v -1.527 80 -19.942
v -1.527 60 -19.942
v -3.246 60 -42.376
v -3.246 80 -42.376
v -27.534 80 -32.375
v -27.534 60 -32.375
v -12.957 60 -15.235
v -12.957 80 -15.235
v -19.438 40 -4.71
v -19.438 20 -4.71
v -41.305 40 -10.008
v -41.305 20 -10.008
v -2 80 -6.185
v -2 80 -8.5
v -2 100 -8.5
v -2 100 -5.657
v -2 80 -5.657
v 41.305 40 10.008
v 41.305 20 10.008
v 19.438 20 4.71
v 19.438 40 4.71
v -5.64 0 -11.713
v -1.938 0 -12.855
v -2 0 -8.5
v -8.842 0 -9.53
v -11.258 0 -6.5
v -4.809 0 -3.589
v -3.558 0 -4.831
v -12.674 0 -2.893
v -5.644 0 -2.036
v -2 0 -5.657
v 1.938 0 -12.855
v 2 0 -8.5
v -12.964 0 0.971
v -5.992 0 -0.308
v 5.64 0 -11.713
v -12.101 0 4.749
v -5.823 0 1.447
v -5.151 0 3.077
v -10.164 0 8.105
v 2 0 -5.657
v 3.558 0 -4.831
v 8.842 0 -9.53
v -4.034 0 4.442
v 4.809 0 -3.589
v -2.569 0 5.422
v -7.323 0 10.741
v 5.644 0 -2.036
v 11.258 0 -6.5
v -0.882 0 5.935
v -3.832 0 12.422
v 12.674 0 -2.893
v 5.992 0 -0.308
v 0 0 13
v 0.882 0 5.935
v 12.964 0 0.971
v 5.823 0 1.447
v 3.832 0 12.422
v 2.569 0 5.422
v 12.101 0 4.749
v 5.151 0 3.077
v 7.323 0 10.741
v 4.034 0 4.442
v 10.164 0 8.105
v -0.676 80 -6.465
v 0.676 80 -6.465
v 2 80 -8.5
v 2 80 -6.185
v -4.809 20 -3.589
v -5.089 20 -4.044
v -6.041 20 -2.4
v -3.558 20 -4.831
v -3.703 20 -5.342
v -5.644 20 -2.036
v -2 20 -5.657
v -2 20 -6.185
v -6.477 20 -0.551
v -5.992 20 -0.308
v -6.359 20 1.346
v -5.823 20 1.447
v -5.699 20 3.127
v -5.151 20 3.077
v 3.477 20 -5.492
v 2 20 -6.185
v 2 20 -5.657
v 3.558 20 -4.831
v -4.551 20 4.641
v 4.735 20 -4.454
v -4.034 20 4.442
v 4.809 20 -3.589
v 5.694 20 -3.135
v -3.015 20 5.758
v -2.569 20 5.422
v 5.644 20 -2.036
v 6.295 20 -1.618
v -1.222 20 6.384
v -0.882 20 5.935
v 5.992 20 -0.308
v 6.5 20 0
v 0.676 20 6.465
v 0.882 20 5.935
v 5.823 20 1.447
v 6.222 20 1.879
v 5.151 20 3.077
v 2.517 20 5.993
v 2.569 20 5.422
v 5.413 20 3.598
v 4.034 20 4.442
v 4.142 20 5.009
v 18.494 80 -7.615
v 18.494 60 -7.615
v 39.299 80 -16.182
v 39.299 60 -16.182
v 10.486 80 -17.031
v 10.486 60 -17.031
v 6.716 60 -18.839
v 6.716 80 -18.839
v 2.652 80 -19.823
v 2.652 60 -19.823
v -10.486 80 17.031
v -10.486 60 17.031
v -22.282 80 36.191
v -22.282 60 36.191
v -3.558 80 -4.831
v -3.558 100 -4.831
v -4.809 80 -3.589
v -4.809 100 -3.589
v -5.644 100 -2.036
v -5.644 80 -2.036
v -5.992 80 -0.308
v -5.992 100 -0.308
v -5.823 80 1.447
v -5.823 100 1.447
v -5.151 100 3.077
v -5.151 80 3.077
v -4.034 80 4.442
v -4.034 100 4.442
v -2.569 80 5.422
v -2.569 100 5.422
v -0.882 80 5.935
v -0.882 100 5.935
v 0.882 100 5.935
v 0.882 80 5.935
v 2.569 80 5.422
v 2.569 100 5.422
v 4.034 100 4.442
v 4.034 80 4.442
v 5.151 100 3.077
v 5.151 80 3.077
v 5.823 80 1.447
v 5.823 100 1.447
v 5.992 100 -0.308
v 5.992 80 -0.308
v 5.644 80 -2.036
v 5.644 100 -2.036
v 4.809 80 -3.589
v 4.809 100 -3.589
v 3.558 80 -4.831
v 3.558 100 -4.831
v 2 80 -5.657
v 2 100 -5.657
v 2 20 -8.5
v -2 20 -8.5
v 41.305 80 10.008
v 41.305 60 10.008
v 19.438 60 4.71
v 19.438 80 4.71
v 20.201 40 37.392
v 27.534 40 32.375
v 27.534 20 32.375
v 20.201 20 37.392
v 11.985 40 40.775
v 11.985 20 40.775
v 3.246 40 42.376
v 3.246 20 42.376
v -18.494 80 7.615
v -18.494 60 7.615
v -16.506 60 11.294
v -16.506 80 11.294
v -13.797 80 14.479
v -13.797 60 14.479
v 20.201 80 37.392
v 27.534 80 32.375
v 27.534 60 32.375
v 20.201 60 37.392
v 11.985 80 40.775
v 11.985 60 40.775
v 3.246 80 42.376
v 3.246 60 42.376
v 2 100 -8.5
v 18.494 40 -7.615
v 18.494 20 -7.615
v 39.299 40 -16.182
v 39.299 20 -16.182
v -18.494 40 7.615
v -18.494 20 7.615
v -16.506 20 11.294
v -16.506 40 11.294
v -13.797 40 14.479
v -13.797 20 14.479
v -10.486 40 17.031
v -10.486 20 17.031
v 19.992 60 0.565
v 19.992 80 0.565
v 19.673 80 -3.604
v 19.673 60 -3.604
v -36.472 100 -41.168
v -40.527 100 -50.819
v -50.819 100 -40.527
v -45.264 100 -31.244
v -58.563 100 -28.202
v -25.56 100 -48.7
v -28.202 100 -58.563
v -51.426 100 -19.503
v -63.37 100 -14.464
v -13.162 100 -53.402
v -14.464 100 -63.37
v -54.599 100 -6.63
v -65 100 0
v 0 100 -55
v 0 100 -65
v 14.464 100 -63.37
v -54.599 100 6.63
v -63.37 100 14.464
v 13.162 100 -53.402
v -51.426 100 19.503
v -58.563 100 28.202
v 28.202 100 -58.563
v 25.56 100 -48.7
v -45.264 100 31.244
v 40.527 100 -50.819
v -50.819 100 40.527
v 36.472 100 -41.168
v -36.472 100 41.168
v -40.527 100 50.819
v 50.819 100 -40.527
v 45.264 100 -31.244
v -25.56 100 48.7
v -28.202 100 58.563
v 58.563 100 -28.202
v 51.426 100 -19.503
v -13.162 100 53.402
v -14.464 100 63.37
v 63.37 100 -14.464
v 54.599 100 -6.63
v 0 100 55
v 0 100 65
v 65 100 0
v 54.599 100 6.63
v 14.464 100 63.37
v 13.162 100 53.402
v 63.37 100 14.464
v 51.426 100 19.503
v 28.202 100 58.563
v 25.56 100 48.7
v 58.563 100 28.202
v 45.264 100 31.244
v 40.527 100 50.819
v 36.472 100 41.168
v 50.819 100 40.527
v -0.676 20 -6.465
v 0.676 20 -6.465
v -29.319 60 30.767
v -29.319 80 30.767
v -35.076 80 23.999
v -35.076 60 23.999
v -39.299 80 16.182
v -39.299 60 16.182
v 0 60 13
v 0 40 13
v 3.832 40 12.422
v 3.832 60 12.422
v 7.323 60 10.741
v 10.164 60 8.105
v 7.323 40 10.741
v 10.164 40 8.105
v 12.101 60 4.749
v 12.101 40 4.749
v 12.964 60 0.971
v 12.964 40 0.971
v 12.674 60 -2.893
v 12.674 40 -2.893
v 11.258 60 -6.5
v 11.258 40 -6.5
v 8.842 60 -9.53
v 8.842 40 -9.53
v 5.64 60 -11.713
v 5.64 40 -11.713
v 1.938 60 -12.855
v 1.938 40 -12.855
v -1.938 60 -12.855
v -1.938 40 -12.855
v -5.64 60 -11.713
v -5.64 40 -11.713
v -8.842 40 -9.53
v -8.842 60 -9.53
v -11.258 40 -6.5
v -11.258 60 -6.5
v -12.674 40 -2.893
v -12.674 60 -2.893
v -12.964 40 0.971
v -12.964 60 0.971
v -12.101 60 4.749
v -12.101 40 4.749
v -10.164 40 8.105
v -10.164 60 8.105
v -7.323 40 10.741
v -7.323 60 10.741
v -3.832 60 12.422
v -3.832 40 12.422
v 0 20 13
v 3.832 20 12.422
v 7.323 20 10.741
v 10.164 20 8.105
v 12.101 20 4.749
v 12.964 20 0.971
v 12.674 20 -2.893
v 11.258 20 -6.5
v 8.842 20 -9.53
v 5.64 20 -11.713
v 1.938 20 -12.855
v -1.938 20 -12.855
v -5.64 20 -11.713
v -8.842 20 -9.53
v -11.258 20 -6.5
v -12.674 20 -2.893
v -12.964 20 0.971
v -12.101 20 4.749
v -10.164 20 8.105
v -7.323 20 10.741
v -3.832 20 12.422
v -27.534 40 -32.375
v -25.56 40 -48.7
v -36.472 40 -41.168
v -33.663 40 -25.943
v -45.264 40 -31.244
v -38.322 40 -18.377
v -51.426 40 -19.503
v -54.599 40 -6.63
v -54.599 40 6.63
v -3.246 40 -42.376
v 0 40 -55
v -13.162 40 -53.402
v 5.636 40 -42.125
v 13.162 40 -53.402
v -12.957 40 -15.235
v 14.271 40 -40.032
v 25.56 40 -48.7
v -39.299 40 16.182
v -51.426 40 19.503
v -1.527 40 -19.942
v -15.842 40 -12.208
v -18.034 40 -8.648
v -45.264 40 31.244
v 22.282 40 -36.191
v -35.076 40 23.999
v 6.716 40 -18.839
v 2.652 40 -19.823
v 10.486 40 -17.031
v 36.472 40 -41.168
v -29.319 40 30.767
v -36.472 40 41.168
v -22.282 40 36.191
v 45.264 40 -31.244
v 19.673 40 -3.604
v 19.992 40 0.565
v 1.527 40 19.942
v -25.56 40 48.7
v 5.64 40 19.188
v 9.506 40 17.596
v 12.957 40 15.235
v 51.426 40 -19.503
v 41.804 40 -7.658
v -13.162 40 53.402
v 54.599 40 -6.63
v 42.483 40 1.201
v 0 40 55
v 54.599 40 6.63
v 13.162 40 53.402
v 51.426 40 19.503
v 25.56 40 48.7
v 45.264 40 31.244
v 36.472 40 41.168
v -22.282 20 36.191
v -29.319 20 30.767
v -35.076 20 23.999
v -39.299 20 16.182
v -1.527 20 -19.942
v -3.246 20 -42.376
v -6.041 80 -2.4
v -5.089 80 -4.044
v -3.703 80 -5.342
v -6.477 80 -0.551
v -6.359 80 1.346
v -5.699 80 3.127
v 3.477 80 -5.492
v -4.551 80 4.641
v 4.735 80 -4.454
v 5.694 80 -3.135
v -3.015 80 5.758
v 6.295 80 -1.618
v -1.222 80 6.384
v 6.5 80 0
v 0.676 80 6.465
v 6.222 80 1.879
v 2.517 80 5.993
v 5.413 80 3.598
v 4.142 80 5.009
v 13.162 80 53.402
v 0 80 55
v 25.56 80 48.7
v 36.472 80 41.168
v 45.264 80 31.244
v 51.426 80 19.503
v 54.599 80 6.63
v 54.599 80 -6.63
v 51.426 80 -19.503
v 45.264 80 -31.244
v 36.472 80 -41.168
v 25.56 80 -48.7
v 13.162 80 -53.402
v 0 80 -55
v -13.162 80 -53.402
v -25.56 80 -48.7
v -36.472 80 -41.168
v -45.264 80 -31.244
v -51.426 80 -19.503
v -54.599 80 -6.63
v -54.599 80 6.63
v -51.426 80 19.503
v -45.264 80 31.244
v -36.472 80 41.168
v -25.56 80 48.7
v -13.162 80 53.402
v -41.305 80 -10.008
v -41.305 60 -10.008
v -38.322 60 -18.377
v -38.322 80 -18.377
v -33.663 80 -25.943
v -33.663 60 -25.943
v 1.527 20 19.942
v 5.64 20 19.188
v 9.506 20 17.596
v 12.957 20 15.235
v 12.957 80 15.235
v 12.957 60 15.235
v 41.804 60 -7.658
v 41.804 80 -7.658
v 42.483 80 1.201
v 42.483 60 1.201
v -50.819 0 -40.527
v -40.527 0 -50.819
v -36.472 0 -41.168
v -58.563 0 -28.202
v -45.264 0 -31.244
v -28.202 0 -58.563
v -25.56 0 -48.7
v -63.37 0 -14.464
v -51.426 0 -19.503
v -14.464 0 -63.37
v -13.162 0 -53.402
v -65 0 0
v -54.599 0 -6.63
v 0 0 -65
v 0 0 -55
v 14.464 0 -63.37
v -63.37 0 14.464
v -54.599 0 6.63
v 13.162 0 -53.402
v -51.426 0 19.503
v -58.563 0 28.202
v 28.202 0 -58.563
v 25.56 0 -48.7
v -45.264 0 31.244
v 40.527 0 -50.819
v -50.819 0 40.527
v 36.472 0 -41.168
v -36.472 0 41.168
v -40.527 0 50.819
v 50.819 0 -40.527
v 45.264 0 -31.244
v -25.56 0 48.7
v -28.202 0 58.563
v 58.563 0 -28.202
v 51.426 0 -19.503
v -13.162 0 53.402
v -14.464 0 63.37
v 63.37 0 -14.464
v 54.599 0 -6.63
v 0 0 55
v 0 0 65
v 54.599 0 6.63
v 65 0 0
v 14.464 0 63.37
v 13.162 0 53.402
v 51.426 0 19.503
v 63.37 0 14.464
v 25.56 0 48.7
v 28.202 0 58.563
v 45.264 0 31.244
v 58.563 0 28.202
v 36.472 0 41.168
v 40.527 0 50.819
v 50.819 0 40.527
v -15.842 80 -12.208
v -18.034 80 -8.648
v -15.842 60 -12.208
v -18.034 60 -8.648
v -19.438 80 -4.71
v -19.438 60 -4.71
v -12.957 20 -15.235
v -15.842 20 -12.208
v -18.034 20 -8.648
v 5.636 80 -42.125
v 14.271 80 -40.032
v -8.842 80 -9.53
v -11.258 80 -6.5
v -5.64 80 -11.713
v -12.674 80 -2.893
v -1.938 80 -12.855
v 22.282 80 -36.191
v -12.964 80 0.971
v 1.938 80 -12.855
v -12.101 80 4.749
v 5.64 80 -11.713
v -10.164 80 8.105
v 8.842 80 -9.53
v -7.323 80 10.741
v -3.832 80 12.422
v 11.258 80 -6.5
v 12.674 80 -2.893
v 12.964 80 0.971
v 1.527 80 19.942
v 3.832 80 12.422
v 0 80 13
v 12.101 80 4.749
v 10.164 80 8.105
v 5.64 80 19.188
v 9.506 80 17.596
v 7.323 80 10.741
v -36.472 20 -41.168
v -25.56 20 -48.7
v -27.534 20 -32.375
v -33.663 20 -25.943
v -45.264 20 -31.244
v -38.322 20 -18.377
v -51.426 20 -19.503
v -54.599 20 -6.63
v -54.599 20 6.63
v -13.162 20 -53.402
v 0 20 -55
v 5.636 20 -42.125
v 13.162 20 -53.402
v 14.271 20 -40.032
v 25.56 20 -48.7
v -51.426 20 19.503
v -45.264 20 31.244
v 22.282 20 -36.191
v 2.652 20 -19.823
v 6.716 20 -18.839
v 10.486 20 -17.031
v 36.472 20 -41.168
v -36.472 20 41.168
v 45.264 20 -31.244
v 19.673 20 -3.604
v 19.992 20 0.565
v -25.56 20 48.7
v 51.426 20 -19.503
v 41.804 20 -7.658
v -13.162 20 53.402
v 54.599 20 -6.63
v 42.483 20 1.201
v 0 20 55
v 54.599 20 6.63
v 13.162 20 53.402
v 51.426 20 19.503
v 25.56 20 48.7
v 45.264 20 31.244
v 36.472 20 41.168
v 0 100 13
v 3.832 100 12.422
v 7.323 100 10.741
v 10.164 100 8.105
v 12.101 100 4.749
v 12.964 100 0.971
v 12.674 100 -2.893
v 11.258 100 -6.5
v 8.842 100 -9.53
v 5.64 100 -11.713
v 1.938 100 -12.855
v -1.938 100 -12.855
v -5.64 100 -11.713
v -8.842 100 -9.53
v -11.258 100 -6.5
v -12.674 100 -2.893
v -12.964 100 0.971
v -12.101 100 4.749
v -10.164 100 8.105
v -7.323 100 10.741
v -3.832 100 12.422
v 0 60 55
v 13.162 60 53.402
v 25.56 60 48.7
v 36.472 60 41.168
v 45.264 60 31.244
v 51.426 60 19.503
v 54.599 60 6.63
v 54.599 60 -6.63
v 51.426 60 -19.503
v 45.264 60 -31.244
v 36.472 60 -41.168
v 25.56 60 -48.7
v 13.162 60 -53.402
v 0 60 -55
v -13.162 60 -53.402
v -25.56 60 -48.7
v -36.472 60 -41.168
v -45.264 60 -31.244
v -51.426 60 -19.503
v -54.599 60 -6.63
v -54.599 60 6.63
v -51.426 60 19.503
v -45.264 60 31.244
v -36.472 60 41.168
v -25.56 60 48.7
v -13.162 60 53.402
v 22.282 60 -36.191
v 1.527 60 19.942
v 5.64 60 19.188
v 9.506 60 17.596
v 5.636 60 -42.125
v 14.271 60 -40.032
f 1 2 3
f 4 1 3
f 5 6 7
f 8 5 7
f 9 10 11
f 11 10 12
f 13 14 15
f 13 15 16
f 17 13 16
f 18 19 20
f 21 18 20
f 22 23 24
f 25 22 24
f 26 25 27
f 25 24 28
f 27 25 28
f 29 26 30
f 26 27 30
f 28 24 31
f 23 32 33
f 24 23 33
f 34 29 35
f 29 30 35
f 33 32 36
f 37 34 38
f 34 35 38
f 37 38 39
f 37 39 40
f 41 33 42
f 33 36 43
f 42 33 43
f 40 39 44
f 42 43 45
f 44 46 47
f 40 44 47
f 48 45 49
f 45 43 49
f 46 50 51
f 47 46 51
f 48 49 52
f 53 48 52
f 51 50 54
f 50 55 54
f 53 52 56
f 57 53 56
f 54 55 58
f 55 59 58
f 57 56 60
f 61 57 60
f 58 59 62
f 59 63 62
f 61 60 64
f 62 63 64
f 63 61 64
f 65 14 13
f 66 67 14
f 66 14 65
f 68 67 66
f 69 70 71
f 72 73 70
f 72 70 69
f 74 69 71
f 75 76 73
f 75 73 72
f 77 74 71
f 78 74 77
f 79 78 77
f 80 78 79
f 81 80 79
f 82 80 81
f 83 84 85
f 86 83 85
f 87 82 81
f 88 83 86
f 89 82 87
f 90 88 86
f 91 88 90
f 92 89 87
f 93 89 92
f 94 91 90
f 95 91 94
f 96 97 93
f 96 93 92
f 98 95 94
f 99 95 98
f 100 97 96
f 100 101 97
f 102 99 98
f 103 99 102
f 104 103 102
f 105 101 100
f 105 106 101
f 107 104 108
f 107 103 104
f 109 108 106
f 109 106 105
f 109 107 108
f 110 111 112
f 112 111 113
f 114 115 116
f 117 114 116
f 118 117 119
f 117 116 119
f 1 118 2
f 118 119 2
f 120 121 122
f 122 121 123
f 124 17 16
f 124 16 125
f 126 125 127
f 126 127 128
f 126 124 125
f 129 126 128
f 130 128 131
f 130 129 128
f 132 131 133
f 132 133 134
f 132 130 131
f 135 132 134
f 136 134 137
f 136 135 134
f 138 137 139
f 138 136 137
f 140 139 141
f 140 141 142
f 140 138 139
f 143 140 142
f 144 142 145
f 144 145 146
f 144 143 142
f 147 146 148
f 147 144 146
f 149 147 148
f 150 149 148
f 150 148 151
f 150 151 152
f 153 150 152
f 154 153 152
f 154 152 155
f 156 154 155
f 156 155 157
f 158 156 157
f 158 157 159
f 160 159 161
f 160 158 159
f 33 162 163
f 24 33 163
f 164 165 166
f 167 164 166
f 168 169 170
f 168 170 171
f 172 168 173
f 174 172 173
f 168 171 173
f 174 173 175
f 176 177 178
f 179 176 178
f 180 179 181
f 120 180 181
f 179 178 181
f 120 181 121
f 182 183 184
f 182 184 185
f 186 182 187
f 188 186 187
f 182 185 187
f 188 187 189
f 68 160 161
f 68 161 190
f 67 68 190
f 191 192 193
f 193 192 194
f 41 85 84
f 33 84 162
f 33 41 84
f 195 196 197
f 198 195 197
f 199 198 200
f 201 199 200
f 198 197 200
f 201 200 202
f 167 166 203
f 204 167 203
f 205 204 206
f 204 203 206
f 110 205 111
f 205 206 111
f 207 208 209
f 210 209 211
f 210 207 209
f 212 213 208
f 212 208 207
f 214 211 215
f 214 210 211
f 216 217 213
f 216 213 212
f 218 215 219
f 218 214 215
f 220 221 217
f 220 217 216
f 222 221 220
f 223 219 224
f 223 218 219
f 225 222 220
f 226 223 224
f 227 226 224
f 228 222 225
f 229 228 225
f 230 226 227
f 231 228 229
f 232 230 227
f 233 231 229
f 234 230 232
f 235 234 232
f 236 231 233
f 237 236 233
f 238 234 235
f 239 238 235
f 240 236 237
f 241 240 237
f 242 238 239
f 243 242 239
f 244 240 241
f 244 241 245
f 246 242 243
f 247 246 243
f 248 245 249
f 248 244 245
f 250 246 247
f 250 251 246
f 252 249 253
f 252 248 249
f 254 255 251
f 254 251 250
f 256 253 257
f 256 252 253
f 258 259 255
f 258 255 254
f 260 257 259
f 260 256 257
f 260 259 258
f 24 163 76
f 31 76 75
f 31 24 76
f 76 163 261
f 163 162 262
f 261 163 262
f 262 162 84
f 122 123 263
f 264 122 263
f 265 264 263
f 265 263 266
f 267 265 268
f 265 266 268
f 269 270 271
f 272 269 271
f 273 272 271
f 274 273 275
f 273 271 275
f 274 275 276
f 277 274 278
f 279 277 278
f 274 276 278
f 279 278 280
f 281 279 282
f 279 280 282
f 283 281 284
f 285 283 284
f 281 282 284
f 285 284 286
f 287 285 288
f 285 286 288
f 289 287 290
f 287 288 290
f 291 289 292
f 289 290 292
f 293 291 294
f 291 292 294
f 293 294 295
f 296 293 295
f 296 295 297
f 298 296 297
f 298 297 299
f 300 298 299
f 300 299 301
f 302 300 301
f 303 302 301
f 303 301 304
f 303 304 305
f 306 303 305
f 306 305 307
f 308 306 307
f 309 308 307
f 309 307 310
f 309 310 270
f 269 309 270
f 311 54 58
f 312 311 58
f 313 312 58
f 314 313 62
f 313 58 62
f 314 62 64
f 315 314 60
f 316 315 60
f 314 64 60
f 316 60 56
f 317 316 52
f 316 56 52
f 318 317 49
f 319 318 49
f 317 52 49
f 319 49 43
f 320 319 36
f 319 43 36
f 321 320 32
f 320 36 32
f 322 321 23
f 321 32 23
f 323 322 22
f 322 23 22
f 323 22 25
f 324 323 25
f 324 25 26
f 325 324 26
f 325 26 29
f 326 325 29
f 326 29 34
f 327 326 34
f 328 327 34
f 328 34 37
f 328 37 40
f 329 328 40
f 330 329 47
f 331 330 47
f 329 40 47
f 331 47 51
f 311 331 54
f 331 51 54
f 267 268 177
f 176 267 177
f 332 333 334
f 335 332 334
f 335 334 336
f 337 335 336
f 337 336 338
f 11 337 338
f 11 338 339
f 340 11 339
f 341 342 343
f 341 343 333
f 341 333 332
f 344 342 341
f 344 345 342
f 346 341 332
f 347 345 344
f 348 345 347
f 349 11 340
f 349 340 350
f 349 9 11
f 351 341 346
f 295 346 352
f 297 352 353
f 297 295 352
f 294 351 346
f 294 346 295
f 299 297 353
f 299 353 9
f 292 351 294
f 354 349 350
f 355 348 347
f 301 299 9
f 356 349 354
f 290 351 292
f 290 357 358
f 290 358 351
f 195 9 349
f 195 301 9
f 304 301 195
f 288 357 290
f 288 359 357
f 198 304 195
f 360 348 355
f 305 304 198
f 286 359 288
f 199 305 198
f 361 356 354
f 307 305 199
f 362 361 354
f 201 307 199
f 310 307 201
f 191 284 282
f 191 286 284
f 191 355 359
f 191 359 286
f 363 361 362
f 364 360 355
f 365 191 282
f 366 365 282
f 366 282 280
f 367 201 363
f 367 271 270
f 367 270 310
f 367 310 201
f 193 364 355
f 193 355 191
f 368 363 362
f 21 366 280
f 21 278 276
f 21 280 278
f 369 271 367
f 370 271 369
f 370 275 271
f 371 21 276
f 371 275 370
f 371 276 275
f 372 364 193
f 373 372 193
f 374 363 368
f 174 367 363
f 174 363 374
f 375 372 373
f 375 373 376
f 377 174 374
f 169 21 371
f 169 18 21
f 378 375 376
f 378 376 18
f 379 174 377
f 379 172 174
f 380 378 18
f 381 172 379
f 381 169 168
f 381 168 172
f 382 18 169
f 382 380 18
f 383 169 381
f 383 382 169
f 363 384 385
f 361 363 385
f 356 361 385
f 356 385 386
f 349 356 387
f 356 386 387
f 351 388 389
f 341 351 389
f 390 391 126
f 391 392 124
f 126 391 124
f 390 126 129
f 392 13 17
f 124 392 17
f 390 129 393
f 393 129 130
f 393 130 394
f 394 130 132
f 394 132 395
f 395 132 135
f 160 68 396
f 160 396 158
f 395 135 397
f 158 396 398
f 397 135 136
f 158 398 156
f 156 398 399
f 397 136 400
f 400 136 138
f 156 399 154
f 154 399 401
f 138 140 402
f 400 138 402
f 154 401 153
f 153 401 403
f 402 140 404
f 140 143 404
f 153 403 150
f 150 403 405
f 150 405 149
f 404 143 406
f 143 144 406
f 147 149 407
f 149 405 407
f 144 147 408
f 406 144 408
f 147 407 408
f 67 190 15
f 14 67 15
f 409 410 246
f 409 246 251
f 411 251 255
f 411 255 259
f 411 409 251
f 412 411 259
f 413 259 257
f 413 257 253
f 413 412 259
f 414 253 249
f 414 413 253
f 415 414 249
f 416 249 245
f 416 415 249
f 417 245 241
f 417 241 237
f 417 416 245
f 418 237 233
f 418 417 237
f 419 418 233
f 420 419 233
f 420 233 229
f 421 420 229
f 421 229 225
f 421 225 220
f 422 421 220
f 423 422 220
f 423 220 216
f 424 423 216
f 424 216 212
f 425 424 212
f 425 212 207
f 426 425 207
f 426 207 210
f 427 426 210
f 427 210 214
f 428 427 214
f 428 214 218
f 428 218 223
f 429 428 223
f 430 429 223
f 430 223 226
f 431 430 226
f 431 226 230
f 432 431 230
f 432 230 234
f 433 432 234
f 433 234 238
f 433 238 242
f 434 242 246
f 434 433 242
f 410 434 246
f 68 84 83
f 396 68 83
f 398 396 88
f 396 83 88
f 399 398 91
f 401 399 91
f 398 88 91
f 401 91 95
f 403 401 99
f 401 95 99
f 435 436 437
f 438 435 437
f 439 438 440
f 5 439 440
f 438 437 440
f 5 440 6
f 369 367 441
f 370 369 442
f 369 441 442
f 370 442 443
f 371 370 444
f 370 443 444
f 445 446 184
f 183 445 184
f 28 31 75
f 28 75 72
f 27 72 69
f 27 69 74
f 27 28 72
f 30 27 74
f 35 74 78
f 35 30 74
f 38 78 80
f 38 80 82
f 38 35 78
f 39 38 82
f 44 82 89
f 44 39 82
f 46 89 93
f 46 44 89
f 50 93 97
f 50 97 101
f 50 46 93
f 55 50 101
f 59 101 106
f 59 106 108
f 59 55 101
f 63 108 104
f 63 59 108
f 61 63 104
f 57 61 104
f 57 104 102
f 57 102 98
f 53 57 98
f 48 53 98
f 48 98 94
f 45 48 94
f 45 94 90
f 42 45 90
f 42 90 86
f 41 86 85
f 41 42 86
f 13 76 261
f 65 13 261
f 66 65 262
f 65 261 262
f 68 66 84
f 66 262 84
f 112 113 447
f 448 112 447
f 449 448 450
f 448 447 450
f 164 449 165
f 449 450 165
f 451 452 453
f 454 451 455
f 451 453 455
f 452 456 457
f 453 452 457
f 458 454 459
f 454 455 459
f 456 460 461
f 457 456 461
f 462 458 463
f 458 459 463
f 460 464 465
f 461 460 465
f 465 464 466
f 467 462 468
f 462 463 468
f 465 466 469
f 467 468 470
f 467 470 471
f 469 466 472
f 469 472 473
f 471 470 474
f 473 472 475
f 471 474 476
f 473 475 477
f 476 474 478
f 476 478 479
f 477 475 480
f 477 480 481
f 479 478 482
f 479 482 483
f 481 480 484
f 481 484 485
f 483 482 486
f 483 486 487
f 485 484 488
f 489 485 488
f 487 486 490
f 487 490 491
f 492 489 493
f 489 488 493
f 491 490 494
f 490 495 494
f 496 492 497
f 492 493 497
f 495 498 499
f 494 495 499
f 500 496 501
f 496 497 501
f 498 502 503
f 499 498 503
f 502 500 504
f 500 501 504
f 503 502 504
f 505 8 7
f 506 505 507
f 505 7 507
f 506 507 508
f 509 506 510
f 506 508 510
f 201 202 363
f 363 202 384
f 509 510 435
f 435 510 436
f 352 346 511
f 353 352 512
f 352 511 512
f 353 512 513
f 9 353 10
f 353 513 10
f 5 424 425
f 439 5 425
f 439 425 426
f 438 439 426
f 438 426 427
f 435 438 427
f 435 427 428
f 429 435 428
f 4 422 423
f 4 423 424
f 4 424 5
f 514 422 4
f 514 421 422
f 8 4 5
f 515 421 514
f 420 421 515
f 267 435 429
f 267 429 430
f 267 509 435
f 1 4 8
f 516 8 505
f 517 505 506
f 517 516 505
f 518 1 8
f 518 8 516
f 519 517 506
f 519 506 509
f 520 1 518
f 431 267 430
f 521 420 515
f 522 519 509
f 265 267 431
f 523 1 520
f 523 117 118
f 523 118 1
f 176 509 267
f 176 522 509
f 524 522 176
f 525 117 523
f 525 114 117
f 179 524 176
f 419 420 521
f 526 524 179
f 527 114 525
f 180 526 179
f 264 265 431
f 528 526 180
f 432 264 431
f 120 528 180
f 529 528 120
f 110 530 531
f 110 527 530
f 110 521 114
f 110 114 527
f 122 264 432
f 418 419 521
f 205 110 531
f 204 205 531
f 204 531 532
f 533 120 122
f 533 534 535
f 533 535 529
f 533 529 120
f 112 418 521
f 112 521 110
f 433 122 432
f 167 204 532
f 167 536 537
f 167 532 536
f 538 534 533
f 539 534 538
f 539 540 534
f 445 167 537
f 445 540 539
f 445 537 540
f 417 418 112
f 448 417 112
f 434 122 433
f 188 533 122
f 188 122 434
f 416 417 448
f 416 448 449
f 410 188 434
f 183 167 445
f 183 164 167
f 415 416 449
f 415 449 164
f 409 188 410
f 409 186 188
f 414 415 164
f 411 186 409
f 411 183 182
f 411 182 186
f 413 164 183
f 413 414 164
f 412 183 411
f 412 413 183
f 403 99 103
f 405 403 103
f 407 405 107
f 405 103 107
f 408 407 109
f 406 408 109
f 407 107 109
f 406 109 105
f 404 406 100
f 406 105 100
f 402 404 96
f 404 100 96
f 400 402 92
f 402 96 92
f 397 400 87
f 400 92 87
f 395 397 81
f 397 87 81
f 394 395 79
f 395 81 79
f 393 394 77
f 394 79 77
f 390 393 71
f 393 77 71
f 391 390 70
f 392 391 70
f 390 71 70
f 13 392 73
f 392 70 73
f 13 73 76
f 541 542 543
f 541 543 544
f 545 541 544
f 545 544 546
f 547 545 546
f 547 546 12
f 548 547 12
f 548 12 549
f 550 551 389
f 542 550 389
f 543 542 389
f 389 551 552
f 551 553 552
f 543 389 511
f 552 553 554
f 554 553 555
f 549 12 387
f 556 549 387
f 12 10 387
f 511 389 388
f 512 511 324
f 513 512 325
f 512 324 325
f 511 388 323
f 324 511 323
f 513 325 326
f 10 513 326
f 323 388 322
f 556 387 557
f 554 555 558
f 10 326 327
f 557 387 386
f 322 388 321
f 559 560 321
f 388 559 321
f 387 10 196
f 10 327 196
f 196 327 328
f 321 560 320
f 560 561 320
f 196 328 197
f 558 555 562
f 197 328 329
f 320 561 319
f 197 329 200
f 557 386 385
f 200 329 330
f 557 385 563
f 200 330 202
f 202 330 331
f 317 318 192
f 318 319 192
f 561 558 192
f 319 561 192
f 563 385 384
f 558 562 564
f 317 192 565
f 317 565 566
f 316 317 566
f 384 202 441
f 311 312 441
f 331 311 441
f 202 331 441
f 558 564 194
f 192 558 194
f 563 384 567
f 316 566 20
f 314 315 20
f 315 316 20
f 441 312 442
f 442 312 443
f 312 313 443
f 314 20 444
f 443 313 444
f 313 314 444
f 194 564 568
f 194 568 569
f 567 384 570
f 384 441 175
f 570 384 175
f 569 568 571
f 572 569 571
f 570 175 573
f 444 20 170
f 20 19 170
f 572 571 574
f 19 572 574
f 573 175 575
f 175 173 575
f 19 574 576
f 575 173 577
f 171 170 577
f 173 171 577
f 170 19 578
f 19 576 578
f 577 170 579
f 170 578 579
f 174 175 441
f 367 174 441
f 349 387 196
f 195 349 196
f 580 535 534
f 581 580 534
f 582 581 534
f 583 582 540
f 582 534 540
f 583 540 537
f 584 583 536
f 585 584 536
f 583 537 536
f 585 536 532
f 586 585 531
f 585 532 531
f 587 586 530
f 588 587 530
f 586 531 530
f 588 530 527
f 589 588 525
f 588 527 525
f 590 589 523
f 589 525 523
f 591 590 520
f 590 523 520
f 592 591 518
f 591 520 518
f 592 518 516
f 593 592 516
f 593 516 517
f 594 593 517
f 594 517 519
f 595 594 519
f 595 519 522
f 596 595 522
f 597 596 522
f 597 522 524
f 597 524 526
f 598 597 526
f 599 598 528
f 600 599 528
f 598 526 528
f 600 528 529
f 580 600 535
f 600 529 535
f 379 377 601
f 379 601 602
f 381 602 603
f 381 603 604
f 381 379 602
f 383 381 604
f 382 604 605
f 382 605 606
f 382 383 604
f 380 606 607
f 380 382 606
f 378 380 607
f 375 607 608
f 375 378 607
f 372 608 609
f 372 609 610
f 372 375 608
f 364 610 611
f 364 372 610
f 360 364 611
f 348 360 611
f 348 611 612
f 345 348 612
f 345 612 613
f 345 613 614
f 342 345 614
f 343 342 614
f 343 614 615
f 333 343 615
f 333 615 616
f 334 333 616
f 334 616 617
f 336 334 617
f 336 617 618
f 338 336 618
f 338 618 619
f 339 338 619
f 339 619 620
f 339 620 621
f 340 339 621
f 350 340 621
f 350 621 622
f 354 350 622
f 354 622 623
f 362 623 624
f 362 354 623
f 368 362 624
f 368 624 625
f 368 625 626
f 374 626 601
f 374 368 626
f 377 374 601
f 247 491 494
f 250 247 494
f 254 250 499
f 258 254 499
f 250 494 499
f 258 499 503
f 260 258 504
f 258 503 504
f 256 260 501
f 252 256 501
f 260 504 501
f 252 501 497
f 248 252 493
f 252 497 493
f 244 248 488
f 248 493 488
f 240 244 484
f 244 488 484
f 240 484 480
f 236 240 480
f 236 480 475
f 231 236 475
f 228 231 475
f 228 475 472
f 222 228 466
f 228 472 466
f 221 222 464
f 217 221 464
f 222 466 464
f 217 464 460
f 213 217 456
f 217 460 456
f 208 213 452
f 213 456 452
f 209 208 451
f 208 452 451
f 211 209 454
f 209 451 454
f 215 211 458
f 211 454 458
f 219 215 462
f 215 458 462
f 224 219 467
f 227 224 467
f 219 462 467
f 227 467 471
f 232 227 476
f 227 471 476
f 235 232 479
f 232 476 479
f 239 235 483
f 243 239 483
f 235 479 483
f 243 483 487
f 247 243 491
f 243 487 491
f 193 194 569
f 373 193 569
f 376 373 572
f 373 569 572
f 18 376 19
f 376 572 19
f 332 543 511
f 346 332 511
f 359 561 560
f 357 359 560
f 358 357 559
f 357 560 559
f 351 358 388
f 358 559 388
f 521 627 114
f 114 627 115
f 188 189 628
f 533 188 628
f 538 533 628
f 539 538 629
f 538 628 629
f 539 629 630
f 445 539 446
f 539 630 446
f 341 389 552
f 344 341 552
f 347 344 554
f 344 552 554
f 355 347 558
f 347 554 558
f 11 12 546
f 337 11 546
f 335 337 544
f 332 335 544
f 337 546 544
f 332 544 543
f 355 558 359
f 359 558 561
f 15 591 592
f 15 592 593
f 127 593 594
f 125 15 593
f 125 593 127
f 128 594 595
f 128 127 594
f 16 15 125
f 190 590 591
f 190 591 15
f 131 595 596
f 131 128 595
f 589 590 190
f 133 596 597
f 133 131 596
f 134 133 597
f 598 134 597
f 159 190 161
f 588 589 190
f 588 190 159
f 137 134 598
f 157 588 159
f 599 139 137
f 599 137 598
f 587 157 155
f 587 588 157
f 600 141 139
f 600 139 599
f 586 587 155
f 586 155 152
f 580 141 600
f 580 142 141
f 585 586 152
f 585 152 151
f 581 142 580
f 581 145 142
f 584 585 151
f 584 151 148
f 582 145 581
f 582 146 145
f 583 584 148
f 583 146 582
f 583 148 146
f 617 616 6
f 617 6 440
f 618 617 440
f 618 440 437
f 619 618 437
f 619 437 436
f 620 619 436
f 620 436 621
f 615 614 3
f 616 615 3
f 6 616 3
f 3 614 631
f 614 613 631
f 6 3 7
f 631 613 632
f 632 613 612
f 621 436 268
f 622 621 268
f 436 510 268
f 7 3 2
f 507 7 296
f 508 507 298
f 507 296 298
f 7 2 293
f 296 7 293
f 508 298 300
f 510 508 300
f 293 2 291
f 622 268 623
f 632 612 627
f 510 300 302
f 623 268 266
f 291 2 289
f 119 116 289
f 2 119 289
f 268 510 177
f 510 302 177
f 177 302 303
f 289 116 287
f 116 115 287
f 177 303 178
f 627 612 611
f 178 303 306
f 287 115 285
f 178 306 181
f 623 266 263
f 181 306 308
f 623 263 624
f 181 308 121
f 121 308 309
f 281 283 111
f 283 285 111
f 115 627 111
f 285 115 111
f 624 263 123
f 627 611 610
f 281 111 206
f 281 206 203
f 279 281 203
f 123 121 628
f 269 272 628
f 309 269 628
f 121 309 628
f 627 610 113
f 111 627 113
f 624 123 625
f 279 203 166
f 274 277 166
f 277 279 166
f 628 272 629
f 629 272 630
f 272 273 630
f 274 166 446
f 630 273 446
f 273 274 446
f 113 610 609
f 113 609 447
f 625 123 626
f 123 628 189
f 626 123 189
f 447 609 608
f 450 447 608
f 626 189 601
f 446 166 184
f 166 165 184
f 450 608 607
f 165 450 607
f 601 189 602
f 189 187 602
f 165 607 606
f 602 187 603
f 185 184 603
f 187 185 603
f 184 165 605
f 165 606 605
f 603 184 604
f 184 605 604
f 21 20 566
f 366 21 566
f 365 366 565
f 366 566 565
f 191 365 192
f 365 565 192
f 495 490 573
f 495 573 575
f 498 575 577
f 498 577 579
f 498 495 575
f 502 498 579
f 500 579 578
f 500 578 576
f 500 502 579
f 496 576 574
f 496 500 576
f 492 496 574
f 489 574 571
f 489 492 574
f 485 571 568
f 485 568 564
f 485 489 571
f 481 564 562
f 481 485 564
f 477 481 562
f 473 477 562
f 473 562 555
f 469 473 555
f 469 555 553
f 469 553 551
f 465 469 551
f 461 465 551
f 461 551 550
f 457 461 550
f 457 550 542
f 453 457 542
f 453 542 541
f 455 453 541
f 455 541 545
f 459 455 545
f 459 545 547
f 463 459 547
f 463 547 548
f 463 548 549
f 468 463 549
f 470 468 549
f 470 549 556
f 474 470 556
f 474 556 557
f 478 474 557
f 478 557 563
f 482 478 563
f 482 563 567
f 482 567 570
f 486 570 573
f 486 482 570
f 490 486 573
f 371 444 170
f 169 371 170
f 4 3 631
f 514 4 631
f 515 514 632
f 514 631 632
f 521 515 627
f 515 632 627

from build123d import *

# Parameters (mm, degrees)
SKETCH1_R           = 65
SKETCH1_R_2         = 55
BOSS_EXTRUDE1_DEPTH = 100
BOSS_EXTRUDE2_START = 20
SKETCH3_R           = 55
SKETCH3_R_2         = 13
BOSS_EXTRUDE2_DEPTH = 20
BOSS_EXTRUDE3_START = 60
SKETCH3_5_R         = 55
SKETCH3_5_R_2       = 13
BOSS_EXTRUDE3_DEPTH = 20
BOSS_EXTRUDE4_START = 20
SKETCH3_7_R         = 13
SKETCH3_7_R_2       = 6.5
BOSS_EXTRUDE4_DEPTH = 60
SKETCH3_10_R        = 13
BOSS_EXTRUDE5_DEPTH = 20
BOSS_EXTRUDE6_START = 80
SKETCH3_11_R        = 13
BOSS_EXTRUDE6_DEPTH = 20


with BuildPart() as part:
    # Sketch1 → Boss-Extrude1 (new body)
    with BuildSketch(Plane(origin=(0, 0, 0), x_dir=(1, 0, 0), z_dir=(0, 1, 0))):
        Circle(SKETCH1_R)
        Circle(SKETCH1_R_2, mode=Mode.SUBTRACT)
    extrude(amount=BOSS_EXTRUDE1_DEPTH)

    # Sketch3 → Boss-Extrude2 (add)
    with BuildSketch(Plane(origin=(0, 0, 0), x_dir=(1, 0, 0), z_dir=(0, 1, 0)).offset(BOSS_EXTRUDE2_START)):
        Circle(SKETCH3_R)
        with BuildLine():
            ThreePointArc((1.527466732, -19.941585829), (7.614996105, -18.493561969), (12.957116602, -15.235259412))
            Line((12.957116602, -15.235259412), (27.53387278, -32.374926251))
            ThreePointArc((27.53387278, -32.374926251), (16.181866723, -39.298819185), (3.245866806, -42.375869887))
            Line((3.245866806, -42.375869887), (1.527466732, -19.941585829))
        make_face(mode=Mode.SUBTRACT)
        with BuildLine():
            ThreePointArc((-18.493561969, -7.614996105), (-15.235259412, -12.957116602), (-10.485623513, -17.030904249))
            Line((-10.485623513, -17.030904249), (-22.281949965, -36.190671529))
            ThreePointArc((-22.281949965, -36.190671529), (-32.374926251, -27.53387278), (-39.298819185, -16.181866723))
            Line((-39.298819185, -16.181866723), (-18.493561969, -7.614996105))
        make_face(mode=Mode.SUBTRACT)
        with BuildLine():
            ThreePointArc((-12.957116602, 15.235259412), (-17.030904249, 10.485623513), (-19.437588327, 4.709581727))
            Line((-19.437588327, 4.709581727), (-41.304875194, 10.00786117))
            ThreePointArc((-41.304875194, 10.00786117), (-36.190671529, 22.281949965), (-27.53387278, 32.374926251))
            Line((-27.53387278, 32.374926251), (-12.957116602, 15.235259412))
        make_face(mode=Mode.SUBTRACT)
        with BuildLine():
            ThreePointArc((10.485623513, 17.030904249), (4.709581727, 19.437588327), (-1.527466732, 19.941585829))
            Line((-1.527466732, 19.941585829), (-3.245866806, 42.375869887))
            ThreePointArc((-3.245866806, 42.375869887), (10.00786117, 41.304875194), (22.281949965, 36.190671529))
            Line((22.281949965, 36.190671529), (10.485623513, 17.030904249))
        make_face(mode=Mode.SUBTRACT)
        with BuildLine():
            Line((18.493561969, 7.614996105), (39.298819185, 16.181866723))
            ThreePointArc((39.298819185, 16.181866723), (42.375869887, 3.245866806), (41.304875194, -10.00786117))
            Line((41.304875194, -10.00786117), (19.437588327, -4.709581727))
            ThreePointArc((19.437588327, -4.709581727), (19.941585829, 1.527466732), (18.493561969, 7.614996105))
        make_face(mode=Mode.SUBTRACT)
        Circle(SKETCH3_R_2, mode=Mode.SUBTRACT)
    extrude(amount=BOSS_EXTRUDE2_DEPTH)

    # Sketch3<5> → Boss-Extrude3 (add)
    with BuildSketch(Plane(origin=(0, 0, 0), x_dir=(1, 0, 0), z_dir=(0, 1, 0)).offset(BOSS_EXTRUDE3_START)):
        Circle(SKETCH3_5_R)
        with BuildLine():
            ThreePointArc((1.527466732, -19.941585829), (7.614996105, -18.493561969), (12.957116602, -15.235259412))
            Line((12.957116602, -15.235259412), (27.53387278, -32.374926251))
            ThreePointArc((27.53387278, -32.374926251), (16.181866723, -39.298819185), (3.245866806, -42.375869887))
            Line((3.245866806, -42.375869887), (1.527466732, -19.941585829))
        make_face(mode=Mode.SUBTRACT)
        with BuildLine():
            ThreePointArc((-18.493561969, -7.614996105), (-15.235259412, -12.957116602), (-10.485623513, -17.030904249))
            Line((-10.485623513, -17.030904249), (-22.281949965, -36.190671529))
            ThreePointArc((-22.281949965, -36.190671529), (-32.374926251, -27.53387278), (-39.298819185, -16.181866723))
            Line((-39.298819185, -16.181866723), (-18.493561969, -7.614996105))
        make_face(mode=Mode.SUBTRACT)
        with BuildLine():
            ThreePointArc((-12.957116602, 15.235259412), (-17.030904249, 10.485623513), (-19.437588327, 4.709581727))
            Line((-19.437588327, 4.709581727), (-41.304875194, 10.00786117))
            ThreePointArc((-41.304875194, 10.00786117), (-36.190671529, 22.281949965), (-27.53387278, 32.374926251))
            Line((-27.53387278, 32.374926251), (-12.957116602, 15.235259412))
        make_face(mode=Mode.SUBTRACT)
        with BuildLine():
            ThreePointArc((10.485623513, 17.030904249), (4.709581727, 19.437588327), (-1.527466732, 19.941585829))
            Line((-1.527466732, 19.941585829), (-3.245866806, 42.375869887))
            ThreePointArc((-3.245866806, 42.375869887), (10.00786117, 41.304875194), (22.281949965, 36.190671529))
            Line((22.281949965, 36.190671529), (10.485623513, 17.030904249))
        make_face(mode=Mode.SUBTRACT)
        with BuildLine():
            Line((18.493561969, 7.614996105), (39.298819185, 16.181866723))
            ThreePointArc((39.298819185, 16.181866723), (42.375869887, 3.245866806), (41.304875194, -10.00786117))
            Line((41.304875194, -10.00786117), (19.437588327, -4.709581727))
            ThreePointArc((19.437588327, -4.709581727), (19.941585829, 1.527466732), (18.493561969, 7.614996105))
        make_face(mode=Mode.SUBTRACT)
        Circle(SKETCH3_5_R_2, mode=Mode.SUBTRACT)
    extrude(amount=BOSS_EXTRUDE3_DEPTH)

    # Sketch3<7> → Boss-Extrude4 (add)
    with BuildSketch(Plane(origin=(0, 0, 0), x_dir=(1, 0, 0), z_dir=(0, 1, 0)).offset(BOSS_EXTRUDE4_START)):
        Circle(SKETCH3_7_R)
        Circle(SKETCH3_7_R_2, mode=Mode.SUBTRACT)
    extrude(amount=BOSS_EXTRUDE4_DEPTH)

    # Sketch3<10> → Boss-Extrude5 (add)
    with BuildSketch(Plane(origin=(0, 0, 0), x_dir=(1, 0, 0), z_dir=(0, 1, 0))):
        Circle(SKETCH3_10_R)
        with BuildLine():
            ThreePointArc((2, 5.656854249), (0, -6), (-2, 5.656854249))
            Line((-2, 5.656854249), (-2, 8.5))
            Line((-2, 8.5), (2, 8.5))
            Line((2, 8.5), (2, 5.656854249))
        make_face(mode=Mode.SUBTRACT)
    extrude(amount=BOSS_EXTRUDE5_DEPTH)

    # Sketch3<11> → Boss-Extrude6 (add)
    with BuildSketch(Plane(origin=(0, 0, 0), x_dir=(1, 0, 0), z_dir=(0, 1, 0)).offset(BOSS_EXTRUDE6_START)):
        Circle(SKETCH3_11_R)
        with BuildLine():
            ThreePointArc((2, 5.656854249), (0, -6), (-2, 5.656854249))
            Line((-2, 5.656854249), (-2, 8.5))
            Line((-2, 8.5), (2, 8.5))
            Line((2, 8.5), (2, 5.656854249))
        make_face(mode=Mode.SUBTRACT)
    extrude(amount=BOSS_EXTRUDE6_DEPTH)


solid = part.part
